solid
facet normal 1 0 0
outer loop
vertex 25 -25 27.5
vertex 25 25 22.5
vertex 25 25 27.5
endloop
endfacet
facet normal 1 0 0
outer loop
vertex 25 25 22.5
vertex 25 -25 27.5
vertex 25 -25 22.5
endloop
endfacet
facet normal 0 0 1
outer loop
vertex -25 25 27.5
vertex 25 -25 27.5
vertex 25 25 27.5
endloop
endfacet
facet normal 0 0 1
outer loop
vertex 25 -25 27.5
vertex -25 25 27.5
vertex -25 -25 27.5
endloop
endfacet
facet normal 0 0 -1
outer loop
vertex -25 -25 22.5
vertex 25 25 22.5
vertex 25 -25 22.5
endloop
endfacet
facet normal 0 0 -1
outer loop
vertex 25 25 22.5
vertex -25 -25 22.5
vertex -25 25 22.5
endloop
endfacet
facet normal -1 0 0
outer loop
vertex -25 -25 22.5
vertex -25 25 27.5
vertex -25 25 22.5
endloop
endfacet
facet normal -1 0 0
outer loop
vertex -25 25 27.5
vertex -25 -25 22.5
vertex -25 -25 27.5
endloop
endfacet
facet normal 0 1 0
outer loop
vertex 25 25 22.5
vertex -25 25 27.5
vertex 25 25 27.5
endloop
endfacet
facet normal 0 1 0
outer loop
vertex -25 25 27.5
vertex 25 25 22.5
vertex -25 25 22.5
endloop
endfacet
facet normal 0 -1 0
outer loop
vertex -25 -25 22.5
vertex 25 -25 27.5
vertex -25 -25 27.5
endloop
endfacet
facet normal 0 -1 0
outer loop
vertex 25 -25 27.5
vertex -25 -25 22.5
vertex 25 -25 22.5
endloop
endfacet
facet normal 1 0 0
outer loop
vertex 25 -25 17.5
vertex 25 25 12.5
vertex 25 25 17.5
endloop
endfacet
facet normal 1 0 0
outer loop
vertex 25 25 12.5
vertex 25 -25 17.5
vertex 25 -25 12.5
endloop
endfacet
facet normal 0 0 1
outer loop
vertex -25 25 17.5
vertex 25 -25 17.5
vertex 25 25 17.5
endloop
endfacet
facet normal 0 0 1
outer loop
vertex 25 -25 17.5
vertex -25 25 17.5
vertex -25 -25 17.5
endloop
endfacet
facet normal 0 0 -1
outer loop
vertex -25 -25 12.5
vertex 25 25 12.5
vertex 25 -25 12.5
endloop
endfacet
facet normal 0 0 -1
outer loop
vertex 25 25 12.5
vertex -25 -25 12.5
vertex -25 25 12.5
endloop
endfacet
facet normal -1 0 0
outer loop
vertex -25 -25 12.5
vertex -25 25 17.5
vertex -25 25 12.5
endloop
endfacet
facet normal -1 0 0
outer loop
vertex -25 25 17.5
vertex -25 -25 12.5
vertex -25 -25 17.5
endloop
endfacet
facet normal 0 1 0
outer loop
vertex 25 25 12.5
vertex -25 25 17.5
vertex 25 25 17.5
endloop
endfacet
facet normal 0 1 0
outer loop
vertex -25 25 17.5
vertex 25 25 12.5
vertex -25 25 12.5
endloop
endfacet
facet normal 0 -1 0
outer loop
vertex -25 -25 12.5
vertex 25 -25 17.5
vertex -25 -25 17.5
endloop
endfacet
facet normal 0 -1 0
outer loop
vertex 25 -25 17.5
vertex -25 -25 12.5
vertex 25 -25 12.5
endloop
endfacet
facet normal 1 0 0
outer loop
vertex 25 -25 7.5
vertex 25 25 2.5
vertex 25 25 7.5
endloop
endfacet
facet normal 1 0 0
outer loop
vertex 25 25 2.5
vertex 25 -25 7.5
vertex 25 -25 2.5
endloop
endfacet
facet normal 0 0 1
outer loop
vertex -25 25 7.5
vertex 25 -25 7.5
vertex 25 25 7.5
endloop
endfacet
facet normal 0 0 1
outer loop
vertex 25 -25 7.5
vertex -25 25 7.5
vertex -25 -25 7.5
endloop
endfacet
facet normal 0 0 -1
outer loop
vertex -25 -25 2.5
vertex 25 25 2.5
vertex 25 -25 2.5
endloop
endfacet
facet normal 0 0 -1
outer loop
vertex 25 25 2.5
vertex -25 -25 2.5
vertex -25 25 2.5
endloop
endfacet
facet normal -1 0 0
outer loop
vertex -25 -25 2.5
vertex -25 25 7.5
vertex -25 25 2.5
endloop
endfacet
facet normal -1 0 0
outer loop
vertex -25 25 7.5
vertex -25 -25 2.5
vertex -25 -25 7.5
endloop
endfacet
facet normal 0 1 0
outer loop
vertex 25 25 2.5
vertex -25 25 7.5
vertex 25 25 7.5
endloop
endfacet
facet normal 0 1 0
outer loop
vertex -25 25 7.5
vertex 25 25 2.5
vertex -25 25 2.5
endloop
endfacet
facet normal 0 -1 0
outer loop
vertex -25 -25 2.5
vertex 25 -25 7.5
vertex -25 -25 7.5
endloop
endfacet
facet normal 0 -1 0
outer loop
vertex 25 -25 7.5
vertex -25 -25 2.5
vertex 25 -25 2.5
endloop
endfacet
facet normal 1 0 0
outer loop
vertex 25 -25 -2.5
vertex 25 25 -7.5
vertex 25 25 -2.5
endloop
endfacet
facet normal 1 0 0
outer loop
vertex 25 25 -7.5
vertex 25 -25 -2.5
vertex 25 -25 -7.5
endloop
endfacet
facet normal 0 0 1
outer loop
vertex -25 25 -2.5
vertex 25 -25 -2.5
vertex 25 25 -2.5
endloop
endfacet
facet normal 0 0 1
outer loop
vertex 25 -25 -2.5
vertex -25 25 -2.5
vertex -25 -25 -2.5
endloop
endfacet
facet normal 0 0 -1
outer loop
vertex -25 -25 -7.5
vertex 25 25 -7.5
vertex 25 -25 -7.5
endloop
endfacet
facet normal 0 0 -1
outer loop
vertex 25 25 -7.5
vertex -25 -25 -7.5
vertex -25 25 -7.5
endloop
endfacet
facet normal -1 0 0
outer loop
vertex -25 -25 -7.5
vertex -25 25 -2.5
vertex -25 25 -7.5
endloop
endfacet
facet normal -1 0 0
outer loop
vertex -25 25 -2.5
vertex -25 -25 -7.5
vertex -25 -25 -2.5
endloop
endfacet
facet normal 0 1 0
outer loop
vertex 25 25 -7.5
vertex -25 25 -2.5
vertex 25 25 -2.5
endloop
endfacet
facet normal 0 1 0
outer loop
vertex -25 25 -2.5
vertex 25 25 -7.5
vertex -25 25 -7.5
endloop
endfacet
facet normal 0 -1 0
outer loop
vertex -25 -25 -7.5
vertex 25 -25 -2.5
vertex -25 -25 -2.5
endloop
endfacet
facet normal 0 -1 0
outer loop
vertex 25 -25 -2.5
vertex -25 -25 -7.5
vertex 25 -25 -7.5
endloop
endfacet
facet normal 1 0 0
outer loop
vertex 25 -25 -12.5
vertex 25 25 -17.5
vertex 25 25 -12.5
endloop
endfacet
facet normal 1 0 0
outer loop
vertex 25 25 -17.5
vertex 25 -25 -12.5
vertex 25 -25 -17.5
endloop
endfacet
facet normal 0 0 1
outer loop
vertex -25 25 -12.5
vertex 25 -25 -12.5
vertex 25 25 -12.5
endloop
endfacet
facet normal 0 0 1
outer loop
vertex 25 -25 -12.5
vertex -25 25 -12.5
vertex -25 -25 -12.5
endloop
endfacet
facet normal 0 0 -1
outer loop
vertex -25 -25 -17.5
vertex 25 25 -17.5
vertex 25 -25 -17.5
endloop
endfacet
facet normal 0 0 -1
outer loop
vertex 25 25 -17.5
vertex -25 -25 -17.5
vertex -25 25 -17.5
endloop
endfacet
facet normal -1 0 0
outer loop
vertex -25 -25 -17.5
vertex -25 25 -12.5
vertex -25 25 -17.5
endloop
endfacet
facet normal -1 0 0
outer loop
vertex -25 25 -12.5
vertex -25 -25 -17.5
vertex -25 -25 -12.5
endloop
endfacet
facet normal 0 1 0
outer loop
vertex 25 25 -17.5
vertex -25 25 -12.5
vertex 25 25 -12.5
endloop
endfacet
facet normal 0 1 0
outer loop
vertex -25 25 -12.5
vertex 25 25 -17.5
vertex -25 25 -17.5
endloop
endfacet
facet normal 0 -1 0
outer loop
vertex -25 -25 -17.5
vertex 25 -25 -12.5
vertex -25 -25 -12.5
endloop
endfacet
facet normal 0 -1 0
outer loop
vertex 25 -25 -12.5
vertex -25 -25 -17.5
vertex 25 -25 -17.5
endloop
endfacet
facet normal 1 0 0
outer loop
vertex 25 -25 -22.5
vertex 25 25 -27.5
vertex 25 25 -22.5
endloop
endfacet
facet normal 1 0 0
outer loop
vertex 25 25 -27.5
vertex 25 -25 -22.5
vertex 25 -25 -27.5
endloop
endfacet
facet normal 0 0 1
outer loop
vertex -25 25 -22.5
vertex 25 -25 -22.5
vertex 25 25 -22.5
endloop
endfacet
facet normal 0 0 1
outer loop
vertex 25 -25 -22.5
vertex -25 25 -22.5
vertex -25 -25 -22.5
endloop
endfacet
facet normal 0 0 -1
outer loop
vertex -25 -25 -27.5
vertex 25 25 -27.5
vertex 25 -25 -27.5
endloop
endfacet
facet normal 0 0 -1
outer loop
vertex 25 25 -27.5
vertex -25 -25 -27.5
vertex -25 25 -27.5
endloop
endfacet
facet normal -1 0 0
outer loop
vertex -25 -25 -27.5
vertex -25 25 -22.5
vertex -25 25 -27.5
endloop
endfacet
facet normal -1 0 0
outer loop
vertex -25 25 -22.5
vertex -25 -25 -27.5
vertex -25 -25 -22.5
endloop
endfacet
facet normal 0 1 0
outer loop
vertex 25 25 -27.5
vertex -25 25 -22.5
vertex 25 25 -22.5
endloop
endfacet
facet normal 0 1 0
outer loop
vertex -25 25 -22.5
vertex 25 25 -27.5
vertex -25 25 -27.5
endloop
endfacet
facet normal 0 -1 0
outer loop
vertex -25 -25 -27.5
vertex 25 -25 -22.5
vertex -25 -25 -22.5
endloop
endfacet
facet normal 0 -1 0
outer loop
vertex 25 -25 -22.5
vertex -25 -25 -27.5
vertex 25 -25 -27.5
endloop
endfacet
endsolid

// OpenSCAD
// Define parameters for the flat square plate
plate_size = 50; // Length and width of the square plate
plate_thickness = 5; // Thickness of the plate
plate_spacing = 10; // Spacing between each plate

// Function to create a flat square plate
module flat_square_plate() {
    cube([plate_size, plate_size, plate_thickness], center = true);
}

// Assembly of the flexible coupling
module flexible_coupling() {
    // Layer 1: Topmost plate
    translate([0, 0, plate_spacing * 2.5])
        flat_square_plate();

    // Layer 2: Second plate
    translate([0, 0, plate_spacing * 1.5])
        flat_square_plate();

    // Layer 3: Third plate
    translate([0, 0, plate_spacing * 0.5])
        flat_square_plate();

    // Layer 4: Fourth plate
    translate([0, 0, -plate_spacing * 0.5])
        flat_square_plate();

    // Layer 5: Fifth plate
    translate([0, 0, -plate_spacing * 1.5])
        flat_square_plate();

    // Layer 6: Bottommost plate
    translate([0, 0, -plate_spacing * 2.5])
        flat_square_plate();
}

// Render the flexible coupling
flexible_coupling();
